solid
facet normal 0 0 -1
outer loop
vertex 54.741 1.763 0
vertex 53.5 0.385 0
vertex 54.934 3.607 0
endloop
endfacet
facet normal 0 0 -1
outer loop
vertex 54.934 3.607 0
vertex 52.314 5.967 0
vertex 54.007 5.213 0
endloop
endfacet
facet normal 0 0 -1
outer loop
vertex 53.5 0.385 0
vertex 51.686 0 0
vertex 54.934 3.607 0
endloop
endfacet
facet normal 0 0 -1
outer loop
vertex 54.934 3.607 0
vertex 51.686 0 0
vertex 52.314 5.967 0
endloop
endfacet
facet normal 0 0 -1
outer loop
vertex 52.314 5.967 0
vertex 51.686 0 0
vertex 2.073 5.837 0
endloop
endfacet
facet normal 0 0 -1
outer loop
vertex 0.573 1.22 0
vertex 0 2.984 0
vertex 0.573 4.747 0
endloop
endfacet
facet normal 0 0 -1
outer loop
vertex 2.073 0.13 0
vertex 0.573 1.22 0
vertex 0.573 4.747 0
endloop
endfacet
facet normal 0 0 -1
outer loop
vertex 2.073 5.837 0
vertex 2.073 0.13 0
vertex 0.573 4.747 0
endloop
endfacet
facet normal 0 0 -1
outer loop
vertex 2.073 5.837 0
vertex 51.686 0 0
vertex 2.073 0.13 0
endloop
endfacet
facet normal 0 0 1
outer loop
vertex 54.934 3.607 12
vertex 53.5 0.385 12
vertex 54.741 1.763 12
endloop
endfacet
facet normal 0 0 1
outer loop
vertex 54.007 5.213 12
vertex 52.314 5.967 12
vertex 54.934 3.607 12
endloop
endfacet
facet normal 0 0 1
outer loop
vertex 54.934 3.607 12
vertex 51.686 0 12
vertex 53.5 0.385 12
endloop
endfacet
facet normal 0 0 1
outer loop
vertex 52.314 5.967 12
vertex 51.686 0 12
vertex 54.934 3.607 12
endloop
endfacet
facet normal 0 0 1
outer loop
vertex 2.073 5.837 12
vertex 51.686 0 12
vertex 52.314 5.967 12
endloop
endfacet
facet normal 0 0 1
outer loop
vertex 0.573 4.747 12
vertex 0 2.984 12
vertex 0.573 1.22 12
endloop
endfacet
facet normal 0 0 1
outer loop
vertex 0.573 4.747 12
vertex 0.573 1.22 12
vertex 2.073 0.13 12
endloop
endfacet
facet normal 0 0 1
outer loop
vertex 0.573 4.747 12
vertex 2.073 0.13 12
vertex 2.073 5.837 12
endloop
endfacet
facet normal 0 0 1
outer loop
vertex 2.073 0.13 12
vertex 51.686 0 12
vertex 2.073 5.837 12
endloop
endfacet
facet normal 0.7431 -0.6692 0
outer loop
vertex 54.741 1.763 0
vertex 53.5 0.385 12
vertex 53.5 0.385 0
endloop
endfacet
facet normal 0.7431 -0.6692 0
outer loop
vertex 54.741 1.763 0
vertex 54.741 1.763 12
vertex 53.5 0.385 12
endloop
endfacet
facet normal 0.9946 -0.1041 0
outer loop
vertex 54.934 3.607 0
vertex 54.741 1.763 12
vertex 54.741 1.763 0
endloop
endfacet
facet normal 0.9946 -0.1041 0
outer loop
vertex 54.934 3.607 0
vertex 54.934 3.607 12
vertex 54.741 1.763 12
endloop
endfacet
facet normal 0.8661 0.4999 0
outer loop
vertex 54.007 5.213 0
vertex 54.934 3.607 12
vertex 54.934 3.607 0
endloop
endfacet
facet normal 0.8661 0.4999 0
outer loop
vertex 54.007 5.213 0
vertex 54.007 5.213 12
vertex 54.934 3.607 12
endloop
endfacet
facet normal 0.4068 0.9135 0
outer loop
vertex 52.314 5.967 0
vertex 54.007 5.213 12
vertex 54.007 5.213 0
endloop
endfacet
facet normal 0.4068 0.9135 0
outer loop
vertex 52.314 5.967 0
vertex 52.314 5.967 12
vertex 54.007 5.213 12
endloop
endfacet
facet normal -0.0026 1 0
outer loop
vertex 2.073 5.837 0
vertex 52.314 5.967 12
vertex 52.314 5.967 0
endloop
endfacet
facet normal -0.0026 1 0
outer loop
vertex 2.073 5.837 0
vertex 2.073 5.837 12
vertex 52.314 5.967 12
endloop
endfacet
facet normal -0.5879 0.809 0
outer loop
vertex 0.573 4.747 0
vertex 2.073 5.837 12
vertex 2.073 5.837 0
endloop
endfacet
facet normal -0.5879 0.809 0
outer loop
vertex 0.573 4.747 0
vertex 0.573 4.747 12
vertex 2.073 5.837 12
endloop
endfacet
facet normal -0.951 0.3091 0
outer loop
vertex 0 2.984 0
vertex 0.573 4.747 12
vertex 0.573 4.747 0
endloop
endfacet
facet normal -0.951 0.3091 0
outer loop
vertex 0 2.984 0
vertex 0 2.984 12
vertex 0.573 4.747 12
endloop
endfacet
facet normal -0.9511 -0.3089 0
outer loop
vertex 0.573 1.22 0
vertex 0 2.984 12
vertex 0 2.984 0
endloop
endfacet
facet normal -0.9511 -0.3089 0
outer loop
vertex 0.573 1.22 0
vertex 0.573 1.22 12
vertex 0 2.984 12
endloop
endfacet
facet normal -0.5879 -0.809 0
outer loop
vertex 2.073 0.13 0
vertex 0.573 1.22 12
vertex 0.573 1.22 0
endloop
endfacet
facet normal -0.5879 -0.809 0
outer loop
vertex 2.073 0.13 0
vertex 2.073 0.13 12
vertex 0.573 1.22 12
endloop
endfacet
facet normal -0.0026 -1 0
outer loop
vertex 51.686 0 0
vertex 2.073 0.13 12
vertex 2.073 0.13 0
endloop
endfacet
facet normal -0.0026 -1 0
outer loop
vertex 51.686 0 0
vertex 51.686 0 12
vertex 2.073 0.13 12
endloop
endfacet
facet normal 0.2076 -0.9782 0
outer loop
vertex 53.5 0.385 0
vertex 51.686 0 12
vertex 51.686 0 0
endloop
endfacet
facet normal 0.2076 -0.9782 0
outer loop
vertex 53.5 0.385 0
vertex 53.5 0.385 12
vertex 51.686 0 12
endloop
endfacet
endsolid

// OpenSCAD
$fn = 32;

// ----------------------------------------------------------------------
// Key bar: parallel key, 12 mm thick
// ----------------------------------------------------------------------

// --- parameters (mm) ---
profile_height = 12;      // extrusion height
profile_points = 11;      // points of the closed outline

profile = [[0, 2.984], [0.573, 1.22], [2.073, 0.13], [51.686, 0], [53.5, 0.385], [54.741, 1.763], [54.934, 3.607], [54.007, 5.213], [52.314, 5.967], [2.073, 5.837], [0.573, 4.747]];  // single closed polygon, 11 points, counter clockwise

// --- the one profile operation ---
linear_extrude(height = profile_height) polygon(points = profile);
